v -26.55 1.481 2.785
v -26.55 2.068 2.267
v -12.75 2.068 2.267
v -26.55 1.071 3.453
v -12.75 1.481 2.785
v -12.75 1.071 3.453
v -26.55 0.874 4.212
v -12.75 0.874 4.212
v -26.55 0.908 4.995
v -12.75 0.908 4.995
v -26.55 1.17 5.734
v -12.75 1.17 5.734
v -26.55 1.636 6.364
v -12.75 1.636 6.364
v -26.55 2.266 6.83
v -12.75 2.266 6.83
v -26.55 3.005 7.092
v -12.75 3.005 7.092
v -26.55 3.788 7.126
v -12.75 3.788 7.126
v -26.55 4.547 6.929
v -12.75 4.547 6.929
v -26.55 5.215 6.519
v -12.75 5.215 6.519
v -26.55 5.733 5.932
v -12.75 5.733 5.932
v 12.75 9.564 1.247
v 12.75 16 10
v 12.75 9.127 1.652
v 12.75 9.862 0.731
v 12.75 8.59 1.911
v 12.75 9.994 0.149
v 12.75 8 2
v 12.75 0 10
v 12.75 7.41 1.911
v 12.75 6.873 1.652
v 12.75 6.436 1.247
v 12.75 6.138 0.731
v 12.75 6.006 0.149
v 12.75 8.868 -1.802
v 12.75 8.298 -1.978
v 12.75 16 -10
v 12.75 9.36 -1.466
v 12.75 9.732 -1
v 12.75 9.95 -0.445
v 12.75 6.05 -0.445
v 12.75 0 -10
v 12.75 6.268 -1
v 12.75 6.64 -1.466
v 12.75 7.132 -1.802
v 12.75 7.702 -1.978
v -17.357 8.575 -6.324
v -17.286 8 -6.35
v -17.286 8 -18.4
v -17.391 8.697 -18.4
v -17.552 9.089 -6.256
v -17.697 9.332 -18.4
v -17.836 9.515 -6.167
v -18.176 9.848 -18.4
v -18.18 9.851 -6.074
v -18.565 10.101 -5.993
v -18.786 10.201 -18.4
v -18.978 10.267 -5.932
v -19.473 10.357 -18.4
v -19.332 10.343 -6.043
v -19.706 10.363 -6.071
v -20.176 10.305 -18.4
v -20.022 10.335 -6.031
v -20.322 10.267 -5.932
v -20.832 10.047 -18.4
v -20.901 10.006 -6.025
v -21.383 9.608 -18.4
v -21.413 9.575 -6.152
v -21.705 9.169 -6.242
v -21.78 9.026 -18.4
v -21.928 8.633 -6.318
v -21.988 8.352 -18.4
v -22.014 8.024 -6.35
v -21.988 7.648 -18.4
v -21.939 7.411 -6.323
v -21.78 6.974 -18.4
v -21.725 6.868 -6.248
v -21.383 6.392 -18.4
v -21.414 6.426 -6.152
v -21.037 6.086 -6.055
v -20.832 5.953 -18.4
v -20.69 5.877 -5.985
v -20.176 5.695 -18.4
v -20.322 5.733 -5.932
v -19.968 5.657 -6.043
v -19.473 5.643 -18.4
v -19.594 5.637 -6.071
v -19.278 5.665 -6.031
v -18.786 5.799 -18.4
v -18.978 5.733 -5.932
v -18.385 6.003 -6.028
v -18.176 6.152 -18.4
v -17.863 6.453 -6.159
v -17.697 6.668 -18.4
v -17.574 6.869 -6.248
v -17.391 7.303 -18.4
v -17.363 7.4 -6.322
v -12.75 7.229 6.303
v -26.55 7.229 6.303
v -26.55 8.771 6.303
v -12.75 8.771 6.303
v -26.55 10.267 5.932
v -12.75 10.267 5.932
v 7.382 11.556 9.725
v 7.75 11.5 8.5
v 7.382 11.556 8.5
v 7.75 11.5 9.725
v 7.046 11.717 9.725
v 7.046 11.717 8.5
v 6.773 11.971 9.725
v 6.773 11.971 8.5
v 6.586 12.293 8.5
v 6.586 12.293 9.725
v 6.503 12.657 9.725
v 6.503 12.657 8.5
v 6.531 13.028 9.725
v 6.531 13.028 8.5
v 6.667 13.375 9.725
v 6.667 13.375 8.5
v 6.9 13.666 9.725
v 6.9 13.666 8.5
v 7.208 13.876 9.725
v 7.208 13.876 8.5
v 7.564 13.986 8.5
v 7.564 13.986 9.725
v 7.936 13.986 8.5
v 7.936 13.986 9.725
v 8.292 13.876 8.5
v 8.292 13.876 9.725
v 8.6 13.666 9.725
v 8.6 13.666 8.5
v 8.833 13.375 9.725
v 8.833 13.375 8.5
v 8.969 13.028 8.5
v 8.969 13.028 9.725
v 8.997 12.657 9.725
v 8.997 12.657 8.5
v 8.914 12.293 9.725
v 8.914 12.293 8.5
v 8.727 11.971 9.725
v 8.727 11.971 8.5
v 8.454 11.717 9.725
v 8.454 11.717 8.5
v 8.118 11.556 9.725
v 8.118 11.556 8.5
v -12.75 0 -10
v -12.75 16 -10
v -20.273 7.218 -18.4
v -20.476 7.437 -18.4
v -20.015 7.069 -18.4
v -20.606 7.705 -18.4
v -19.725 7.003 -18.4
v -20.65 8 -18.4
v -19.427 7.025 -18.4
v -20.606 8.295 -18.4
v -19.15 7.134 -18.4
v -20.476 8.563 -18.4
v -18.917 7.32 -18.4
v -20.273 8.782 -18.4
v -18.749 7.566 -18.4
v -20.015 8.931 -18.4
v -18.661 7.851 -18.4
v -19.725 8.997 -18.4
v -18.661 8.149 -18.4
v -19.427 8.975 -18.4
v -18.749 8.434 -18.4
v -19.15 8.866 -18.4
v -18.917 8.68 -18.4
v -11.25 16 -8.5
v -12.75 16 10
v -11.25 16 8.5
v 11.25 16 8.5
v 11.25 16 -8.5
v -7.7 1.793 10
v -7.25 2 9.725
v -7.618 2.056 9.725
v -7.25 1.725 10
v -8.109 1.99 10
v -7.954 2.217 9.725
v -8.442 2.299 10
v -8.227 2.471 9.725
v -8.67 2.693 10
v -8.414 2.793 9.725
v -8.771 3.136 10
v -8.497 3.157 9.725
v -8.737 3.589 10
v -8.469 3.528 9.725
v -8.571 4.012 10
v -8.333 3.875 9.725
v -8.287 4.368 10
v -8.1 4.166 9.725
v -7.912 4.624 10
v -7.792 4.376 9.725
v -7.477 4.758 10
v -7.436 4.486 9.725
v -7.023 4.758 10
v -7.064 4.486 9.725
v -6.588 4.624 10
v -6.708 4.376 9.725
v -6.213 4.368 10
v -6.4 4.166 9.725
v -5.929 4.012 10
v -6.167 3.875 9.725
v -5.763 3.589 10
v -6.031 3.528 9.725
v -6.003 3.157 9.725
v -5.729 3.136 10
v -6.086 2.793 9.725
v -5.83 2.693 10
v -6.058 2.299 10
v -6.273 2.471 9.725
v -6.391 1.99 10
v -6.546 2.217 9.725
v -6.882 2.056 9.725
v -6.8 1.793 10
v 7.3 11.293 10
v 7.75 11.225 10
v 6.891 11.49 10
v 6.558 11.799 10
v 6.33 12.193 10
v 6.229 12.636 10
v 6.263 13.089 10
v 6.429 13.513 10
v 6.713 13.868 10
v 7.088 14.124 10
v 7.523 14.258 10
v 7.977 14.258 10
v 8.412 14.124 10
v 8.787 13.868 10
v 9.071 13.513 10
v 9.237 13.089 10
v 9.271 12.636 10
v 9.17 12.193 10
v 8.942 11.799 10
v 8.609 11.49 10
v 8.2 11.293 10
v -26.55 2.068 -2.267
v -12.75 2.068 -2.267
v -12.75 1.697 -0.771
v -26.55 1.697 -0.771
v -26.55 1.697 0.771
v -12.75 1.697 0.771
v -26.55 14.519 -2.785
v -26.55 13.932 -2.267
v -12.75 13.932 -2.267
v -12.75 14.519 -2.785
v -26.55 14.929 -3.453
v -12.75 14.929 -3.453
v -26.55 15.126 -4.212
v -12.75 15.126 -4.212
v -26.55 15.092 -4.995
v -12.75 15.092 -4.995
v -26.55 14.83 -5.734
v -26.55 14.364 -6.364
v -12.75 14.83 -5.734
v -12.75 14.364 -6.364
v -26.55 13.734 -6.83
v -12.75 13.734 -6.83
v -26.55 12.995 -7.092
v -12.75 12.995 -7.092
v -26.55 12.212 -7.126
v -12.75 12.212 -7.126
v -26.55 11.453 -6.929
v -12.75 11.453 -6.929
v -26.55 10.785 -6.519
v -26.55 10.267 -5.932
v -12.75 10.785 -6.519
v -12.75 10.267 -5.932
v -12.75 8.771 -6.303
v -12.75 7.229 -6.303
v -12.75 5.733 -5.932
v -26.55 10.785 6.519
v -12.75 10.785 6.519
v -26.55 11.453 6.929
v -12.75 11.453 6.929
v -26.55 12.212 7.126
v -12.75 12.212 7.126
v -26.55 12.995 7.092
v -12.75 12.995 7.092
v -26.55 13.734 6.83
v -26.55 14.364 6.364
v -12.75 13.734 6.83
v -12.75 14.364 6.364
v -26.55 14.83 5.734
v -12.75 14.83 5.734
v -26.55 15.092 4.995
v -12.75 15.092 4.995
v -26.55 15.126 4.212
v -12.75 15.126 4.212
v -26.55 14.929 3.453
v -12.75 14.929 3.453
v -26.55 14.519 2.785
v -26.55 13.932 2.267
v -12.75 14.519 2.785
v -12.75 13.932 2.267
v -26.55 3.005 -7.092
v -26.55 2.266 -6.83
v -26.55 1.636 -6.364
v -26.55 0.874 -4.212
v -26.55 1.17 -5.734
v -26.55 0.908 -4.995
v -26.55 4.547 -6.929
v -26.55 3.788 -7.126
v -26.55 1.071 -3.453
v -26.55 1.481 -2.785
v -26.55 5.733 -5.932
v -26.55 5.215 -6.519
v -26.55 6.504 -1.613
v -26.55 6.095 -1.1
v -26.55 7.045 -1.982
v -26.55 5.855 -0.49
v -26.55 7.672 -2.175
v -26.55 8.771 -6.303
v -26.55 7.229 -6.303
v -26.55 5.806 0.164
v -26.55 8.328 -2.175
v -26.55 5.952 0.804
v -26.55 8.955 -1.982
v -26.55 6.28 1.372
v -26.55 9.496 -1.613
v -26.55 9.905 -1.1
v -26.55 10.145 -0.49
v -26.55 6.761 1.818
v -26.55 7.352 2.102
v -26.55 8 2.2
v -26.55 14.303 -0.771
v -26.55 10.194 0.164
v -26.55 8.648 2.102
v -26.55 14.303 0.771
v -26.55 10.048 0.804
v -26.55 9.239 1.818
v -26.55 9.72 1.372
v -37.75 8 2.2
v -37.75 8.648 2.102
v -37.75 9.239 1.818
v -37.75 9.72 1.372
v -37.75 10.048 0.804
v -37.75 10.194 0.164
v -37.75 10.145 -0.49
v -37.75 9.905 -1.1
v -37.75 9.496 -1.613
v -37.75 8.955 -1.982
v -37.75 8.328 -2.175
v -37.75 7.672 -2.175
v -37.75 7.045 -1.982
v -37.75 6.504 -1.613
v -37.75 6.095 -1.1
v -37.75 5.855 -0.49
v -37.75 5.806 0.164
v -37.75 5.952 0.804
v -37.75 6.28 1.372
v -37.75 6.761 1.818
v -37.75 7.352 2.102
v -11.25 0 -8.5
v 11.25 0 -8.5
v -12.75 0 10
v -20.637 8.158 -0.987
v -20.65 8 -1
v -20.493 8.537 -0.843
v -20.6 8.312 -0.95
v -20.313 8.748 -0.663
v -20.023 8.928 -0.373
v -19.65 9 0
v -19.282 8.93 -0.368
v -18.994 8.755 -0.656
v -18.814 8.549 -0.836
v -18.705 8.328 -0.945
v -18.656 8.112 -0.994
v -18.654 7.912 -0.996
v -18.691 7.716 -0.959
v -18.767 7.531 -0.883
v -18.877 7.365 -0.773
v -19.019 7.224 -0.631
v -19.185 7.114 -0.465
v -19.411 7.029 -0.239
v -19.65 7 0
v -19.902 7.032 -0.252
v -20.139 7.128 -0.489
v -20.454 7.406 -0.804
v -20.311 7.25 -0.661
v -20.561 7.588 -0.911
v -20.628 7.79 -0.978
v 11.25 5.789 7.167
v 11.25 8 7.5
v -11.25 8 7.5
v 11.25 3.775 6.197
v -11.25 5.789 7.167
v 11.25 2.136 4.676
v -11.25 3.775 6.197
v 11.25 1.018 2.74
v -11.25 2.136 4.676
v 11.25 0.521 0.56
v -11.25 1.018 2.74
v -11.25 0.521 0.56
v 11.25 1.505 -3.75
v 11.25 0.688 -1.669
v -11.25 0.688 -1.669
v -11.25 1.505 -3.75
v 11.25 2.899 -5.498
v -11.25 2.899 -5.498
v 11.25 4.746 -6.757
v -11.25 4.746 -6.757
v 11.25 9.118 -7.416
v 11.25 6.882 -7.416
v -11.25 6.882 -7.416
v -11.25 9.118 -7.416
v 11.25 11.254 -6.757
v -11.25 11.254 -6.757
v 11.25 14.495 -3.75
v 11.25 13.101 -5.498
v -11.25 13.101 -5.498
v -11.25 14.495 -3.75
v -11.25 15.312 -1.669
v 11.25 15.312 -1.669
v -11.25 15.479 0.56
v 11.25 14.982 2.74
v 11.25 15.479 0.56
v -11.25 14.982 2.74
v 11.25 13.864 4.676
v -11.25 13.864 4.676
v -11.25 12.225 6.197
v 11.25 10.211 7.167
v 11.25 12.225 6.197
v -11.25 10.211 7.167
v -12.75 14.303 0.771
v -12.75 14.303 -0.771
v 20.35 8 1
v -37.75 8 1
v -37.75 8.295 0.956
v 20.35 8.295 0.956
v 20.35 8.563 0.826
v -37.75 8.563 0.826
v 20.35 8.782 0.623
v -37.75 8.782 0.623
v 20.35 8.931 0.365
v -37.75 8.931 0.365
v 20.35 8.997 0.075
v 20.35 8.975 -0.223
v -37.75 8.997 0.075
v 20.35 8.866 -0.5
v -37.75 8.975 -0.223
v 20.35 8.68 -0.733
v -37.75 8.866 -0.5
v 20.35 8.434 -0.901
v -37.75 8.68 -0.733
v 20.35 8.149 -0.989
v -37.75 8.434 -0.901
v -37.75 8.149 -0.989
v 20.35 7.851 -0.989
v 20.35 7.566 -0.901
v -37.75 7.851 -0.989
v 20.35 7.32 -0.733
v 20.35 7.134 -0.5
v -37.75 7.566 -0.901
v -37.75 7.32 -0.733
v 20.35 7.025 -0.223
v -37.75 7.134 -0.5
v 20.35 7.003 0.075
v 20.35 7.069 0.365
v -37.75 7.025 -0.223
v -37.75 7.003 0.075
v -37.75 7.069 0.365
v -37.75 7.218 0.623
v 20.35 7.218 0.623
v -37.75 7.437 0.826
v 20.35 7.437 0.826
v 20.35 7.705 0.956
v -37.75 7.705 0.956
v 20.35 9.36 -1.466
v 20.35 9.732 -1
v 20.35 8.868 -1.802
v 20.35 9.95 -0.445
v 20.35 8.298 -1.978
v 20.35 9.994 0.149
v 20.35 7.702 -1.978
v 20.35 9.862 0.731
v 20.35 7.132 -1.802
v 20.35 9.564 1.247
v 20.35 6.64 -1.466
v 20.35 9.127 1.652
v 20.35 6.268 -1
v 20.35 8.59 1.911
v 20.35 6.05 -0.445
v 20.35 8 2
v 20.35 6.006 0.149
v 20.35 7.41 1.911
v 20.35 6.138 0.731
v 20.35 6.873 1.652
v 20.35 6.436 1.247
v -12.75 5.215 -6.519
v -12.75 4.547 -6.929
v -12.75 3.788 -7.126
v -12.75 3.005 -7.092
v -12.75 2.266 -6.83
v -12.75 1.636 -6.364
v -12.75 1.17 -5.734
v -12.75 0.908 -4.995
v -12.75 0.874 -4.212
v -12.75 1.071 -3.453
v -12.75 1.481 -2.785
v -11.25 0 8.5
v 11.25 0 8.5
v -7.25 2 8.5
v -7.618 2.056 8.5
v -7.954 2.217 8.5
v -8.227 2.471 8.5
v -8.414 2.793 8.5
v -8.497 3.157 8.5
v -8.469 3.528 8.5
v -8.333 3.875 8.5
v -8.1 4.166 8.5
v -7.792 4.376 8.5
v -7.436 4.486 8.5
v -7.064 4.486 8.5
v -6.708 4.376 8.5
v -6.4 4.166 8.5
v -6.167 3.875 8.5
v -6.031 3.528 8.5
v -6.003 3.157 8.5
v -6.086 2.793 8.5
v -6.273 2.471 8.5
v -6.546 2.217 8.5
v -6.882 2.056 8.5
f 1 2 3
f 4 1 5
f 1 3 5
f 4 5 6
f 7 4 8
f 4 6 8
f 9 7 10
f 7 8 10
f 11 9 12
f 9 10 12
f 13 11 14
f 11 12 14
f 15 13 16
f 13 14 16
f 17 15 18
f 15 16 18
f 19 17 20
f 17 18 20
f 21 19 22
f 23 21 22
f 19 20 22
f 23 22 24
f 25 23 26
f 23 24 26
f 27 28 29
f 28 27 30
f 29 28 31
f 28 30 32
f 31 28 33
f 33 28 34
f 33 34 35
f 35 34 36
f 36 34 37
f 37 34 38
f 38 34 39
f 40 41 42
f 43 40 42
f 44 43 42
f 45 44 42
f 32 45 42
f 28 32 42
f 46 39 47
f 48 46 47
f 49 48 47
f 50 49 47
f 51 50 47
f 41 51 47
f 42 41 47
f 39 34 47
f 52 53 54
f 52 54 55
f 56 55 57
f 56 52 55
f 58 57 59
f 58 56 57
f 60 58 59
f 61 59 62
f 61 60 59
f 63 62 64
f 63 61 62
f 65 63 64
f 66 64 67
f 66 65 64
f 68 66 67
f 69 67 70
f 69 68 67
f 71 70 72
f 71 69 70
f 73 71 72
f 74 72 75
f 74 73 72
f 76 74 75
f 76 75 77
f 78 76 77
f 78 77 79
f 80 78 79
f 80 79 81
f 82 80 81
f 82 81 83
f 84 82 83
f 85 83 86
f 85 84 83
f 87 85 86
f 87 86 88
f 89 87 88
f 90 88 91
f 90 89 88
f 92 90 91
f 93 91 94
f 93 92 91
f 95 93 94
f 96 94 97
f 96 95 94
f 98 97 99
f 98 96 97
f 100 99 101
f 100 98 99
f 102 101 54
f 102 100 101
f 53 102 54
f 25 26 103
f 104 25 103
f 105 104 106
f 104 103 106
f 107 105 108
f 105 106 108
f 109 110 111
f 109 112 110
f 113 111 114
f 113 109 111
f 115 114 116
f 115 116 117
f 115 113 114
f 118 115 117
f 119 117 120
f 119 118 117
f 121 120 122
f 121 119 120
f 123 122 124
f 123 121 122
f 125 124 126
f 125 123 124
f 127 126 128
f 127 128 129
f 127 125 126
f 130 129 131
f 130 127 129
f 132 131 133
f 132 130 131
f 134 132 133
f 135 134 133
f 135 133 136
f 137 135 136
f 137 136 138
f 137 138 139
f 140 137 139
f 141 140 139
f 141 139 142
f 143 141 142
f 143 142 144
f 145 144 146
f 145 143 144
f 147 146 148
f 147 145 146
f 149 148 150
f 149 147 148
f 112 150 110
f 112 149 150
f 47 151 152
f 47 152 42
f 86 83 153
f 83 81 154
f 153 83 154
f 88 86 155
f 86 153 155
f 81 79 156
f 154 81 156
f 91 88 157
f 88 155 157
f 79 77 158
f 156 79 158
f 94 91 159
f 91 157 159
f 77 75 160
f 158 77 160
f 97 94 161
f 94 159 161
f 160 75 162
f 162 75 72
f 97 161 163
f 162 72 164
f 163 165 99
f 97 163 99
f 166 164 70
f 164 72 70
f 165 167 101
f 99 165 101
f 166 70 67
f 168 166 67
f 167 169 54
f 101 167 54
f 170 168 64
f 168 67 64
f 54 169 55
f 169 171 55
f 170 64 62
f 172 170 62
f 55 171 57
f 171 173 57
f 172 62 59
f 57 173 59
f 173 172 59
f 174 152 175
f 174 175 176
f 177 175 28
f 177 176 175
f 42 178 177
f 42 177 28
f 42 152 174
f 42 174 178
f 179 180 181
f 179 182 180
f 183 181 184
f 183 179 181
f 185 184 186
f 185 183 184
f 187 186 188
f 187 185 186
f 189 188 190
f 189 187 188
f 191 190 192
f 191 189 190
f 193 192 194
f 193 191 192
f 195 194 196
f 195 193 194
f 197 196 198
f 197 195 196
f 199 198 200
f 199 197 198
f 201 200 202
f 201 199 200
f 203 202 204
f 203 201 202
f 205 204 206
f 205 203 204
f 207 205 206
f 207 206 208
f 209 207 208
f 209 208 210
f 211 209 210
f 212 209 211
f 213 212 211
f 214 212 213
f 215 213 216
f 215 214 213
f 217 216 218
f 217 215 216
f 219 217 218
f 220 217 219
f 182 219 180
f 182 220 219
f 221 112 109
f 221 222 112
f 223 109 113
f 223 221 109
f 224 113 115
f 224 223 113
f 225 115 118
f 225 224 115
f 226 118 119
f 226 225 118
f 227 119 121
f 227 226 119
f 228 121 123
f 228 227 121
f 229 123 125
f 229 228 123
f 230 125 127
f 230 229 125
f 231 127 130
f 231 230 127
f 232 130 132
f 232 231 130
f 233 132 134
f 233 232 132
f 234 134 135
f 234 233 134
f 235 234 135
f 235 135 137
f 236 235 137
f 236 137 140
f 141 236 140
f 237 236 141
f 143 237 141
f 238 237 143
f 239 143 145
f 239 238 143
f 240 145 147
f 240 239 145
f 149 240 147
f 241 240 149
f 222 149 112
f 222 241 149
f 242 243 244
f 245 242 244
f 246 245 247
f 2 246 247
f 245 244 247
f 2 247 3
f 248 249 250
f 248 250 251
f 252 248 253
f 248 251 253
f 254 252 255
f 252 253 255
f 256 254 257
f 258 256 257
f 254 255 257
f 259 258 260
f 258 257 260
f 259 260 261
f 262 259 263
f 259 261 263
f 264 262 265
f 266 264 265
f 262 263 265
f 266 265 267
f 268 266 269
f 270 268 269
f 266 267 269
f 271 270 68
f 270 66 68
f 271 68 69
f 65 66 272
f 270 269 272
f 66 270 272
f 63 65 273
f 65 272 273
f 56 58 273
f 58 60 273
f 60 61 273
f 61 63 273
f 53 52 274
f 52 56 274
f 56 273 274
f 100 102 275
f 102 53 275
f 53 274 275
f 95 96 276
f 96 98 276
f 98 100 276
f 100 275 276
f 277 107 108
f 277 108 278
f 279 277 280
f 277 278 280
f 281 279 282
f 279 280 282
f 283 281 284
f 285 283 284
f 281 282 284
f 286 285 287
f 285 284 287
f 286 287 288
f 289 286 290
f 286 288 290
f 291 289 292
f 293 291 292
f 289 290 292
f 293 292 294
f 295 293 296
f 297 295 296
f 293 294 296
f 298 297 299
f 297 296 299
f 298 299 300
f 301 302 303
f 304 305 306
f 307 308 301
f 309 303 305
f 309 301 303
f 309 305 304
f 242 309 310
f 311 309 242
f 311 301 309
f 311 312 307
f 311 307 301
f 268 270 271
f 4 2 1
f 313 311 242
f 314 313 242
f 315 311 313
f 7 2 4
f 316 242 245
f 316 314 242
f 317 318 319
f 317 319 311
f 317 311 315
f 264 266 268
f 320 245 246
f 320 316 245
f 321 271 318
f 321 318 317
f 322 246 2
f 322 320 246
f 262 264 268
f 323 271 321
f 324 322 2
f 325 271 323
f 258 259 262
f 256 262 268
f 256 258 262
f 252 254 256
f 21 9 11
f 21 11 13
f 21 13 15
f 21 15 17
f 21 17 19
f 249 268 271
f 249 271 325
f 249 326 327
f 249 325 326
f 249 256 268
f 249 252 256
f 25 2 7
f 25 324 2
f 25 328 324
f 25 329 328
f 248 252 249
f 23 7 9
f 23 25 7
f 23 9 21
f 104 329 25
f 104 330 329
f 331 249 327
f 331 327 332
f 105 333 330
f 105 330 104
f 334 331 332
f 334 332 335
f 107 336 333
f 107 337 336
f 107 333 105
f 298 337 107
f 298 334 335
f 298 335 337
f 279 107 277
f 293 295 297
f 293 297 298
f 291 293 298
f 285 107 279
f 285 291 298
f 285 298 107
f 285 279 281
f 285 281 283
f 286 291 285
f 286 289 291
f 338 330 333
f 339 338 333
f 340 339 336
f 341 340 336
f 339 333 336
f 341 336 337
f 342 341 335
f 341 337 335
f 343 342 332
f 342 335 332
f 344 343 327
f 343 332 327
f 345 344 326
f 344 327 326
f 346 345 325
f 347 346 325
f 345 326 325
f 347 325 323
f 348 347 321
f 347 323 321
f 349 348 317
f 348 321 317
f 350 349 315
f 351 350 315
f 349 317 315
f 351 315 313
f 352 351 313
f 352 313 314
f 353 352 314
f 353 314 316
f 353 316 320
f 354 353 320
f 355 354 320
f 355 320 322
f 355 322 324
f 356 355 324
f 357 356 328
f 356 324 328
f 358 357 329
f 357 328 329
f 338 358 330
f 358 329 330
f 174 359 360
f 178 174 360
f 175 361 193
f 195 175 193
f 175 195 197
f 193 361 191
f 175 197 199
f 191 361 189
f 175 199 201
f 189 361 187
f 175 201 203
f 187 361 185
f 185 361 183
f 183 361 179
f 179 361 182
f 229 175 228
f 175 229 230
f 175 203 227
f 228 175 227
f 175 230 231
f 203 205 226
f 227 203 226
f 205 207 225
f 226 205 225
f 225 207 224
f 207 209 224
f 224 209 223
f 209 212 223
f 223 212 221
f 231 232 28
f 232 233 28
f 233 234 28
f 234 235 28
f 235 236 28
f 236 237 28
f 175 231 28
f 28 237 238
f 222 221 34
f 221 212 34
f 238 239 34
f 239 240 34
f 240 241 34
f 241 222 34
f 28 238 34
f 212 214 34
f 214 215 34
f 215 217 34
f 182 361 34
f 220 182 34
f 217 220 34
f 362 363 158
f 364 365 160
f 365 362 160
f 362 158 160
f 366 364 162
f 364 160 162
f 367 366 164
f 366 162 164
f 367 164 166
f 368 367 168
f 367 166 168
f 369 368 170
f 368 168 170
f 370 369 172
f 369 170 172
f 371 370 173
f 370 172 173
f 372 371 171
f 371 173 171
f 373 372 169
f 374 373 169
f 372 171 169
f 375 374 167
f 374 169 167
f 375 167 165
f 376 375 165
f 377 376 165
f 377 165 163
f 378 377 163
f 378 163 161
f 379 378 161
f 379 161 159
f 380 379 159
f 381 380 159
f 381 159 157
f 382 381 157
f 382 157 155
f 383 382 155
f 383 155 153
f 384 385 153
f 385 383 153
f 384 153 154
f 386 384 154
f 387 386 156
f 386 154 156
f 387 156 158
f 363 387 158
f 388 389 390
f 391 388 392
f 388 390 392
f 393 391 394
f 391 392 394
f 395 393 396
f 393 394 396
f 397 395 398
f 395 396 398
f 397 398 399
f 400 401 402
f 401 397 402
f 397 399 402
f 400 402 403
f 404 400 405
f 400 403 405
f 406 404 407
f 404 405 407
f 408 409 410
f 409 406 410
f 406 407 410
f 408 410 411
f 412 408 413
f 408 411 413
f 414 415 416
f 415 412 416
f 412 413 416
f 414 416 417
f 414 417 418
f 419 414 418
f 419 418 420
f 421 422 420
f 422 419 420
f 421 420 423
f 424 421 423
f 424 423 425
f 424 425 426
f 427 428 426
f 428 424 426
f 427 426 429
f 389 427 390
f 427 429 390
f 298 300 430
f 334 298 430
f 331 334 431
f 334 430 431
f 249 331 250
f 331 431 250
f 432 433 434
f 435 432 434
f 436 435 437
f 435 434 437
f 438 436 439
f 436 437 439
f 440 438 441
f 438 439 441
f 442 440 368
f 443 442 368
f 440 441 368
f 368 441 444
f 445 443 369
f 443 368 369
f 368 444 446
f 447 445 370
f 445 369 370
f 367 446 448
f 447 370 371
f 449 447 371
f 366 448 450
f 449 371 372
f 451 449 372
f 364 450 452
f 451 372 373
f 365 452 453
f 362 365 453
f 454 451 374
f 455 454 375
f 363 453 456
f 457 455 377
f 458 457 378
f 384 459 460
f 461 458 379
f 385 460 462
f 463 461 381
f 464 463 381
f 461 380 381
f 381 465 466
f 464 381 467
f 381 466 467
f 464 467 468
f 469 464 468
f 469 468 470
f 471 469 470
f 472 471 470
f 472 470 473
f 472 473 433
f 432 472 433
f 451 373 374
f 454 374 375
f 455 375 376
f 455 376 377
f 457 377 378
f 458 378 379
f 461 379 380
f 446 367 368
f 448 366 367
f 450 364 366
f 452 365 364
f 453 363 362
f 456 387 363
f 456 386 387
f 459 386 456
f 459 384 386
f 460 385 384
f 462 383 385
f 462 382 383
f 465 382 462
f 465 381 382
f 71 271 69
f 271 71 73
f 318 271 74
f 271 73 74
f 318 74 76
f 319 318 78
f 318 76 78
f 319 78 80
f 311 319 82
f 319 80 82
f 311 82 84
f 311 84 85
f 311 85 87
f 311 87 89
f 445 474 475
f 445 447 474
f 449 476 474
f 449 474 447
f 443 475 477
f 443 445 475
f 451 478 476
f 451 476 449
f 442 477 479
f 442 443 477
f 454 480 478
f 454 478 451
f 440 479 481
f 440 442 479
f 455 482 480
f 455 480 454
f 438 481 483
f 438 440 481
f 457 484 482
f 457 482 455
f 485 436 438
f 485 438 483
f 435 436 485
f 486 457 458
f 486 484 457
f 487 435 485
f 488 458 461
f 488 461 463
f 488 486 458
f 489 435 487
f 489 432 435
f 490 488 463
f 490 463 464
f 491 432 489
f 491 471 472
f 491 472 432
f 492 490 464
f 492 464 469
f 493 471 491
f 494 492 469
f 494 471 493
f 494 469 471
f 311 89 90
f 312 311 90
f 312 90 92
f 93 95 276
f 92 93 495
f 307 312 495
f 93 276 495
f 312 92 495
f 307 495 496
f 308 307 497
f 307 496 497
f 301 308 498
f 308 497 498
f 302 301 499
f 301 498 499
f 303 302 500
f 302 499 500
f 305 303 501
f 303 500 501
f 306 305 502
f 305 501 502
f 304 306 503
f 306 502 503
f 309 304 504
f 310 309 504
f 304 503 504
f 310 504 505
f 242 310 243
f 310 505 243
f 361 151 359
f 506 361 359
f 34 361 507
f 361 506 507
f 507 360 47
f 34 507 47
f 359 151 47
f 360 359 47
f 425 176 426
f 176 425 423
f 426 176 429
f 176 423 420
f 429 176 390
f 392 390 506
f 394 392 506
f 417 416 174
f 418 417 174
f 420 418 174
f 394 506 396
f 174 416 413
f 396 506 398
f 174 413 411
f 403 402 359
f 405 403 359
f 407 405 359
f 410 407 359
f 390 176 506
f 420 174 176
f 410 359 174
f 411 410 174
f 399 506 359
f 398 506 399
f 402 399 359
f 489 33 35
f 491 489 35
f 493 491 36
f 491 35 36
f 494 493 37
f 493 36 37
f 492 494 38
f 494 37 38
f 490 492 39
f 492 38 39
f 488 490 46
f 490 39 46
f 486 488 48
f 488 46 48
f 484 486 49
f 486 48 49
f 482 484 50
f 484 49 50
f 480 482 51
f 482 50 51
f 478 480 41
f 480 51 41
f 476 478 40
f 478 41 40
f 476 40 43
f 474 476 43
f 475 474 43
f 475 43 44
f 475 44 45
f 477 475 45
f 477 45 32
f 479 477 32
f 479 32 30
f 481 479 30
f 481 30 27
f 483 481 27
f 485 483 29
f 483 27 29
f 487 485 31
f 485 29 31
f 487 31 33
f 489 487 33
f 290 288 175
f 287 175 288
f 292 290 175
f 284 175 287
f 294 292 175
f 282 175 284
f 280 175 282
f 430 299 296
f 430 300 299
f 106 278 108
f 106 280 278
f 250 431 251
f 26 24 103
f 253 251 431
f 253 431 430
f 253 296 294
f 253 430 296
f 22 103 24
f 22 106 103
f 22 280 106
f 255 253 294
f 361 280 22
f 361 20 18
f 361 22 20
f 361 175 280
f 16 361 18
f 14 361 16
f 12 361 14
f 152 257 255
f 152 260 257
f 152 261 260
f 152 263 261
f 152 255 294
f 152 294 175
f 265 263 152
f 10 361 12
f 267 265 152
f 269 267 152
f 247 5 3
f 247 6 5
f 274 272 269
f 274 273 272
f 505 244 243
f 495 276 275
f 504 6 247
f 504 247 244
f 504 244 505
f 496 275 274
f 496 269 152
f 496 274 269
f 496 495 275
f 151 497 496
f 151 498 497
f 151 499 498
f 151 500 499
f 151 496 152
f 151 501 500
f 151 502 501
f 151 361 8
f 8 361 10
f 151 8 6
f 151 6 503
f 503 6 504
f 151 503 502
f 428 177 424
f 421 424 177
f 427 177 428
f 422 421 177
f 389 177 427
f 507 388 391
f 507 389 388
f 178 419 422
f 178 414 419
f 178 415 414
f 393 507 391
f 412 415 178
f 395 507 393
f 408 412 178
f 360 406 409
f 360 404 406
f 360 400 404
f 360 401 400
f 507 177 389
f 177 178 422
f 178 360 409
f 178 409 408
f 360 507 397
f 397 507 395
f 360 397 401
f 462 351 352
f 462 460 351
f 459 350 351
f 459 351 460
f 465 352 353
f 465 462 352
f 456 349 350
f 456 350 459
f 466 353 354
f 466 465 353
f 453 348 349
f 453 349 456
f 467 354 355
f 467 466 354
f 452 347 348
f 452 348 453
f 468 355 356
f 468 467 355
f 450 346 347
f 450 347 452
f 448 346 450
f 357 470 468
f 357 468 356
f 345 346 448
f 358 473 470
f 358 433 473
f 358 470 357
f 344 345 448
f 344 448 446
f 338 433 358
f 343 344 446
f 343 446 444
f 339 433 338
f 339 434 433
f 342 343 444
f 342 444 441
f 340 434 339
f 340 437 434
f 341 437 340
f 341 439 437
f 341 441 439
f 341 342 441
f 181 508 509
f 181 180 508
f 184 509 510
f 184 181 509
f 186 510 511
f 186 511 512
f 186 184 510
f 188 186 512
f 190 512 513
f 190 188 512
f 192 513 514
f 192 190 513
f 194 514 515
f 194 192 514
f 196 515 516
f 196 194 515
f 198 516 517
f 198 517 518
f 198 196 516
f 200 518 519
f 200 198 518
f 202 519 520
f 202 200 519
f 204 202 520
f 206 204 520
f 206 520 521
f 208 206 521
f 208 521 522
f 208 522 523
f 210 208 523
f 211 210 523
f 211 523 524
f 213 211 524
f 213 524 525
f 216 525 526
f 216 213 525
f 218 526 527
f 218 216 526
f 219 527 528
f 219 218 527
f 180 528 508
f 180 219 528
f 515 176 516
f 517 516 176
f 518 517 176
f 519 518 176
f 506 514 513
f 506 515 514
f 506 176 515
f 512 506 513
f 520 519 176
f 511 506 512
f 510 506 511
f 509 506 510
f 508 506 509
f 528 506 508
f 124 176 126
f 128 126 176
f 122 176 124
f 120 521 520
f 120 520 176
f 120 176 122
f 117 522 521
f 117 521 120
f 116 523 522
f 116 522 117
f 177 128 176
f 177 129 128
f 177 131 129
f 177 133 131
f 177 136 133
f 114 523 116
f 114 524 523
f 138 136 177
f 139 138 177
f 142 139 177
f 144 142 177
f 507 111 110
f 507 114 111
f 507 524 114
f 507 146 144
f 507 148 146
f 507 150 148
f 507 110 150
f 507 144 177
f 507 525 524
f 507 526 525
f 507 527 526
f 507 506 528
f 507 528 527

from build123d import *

# Parameters (mm, degrees)
SKETCH_1_W          = 25.5
SKETCH_1_H          = 20
SKETCH_1_W_2        = 22.5
SKETCH_1_H_2        = 17
EXTRUDE_1_DEPTH     = 16
M3X0_5_1_AT_2_COUNT = 2
M3X0_5_1_AT_2_PITCH = 17.755280905
EXTRUDE_2_REACH     = 32.529
SKETCH_4_R          = 7.5
EXTRUDE_3_DEPTH     = 13.8
SKETCH_6_R          = 2
EXTRUDE_4_DEPTH     = 7.6
SKETCH_7_R          = 2.2
EXTRUDE_5_DEPTH     = 11.2
SKETCH_9_R          = 2.363999551
EXTRUDE_6_DEPTH     = 18.4
SKETCH_10_R         = 1
CUT_EXTRUDE_1_DEPTH = 64.009285059
SKETCH_11_R         = 1
CUT_EXTRUDE_2_DEPTH = 18.4


with BuildPart() as part:
    # 草图1 → 凸台-拉伸1 (new body)
    with BuildSketch(Plane(origin=(0, 0, 0), x_dir=(1, 0, 0), z_dir=(0, 1, 0))):
        Rectangle(SKETCH_1_W, SKETCH_1_H)
        Rectangle(SKETCH_1_W_2, SKETCH_1_H_2, mode=Mode.SUBTRACT)
    extrude(amount=EXTRUDE_1_DEPTH)

    # 草图3 → M3x0.5 螺纹孔1 (revolve, cut)
    with BuildSketch(Plane(origin=(7.75, 12.75, 10), x_dir=(0, -1, 0), z_dir=(1, 0, 0))):
        Polygon((0, 0), (0, 1.5), (1.25, 1.5), (1.25, 0.275), (1.525, 0), align=None)
    m3x0_5_1 = revolve(axis=Axis((7.75, 12.75, 16.35), (0, 0, -1)), mode=Mode.SUBTRACT)

    # M3x0.5 螺纹孔1 at 2: M3x0.5 螺纹孔1 ×2
    with Locations(*[Vector(-0.8448190755542286, -0.5350520811843448, 0) * (i * M3X0_5_1_AT_2_PITCH) for i in range(1, M3X0_5_1_AT_2_COUNT)]):
        add(m3x0_5_1, mode=Mode.SUBTRACT)

    # 草图4 → 凸台-拉伸2 (add, up to next)
    with BuildSketch(Plane(origin=(-11.25, 0, 0), x_dir=(0, 0, -1), z_dir=(1, 0, 0)), mode=Mode.PRIVATE) as extrude_2_sk1:
        with Locations(Location((0, 8, 0), (0, 0, 180))):
            Circle(SKETCH_4_R)
    extrude_2_tool1 = extrude(extrude_2_sk1.sketch, amount=EXTRUDE_2_REACH, mode=Mode.PRIVATE) - part.part
    add(extrude_2_tool1.solids().sort_by_distance((-11.25, 8, 0))[0])

    # 草图5 → 凸台-拉伸3 (add)
    with BuildSketch(Plane.ZY.offset(12.75)):
        with BuildLine():
            ThreePointArc((-5.931717466, 10.266545369), (-6.35, 8), (-5.931717466, 5.733454631))
            ThreePointArc((-5.931717466, 5.733454631), (-6.363961031, 1.636038969), (-2.266545369, 2.068282534))
            ThreePointArc((-2.266545369, 2.068282534), (0, 1.65), (2.266545369, 2.068282534))
            ThreePointArc((2.266545369, 2.068282534), (6.363961031, 1.636038969), (5.931717466, 5.733454631))
            ThreePointArc((5.931717466, 5.733454631), (6.35, 8), (5.931717466, 10.266545369))
            ThreePointArc((5.931717466, 10.266545369), (6.363961031, 14.363961031), (2.266545369, 13.931717466))
            ThreePointArc((2.266545369, 13.931717466), (0, 14.35), (-2.266545369, 13.931717466))
            ThreePointArc((-2.266545369, 13.931717466), (-6.363961031, 14.363961031), (-5.931717466, 10.266545369))
        make_face()
    extrude(amount=EXTRUDE_3_DEPTH)

    # 草图6 → 凸台-拉伸4 (add)
    with BuildSketch(Plane(origin=(12.75, 0, 0), x_dir=(0, 0, -1), z_dir=(1, 0, 0))):
        with Locations(Location((0, 8, 0), (0, 0, 180))):
            Circle(SKETCH_6_R)
    extrude(amount=EXTRUDE_4_DEPTH)

    # 草图7 → 凸台-拉伸5 (add)
    with BuildSketch(Plane.ZY.offset(26.55)):
        with Locations((0, 8)):
            Circle(SKETCH_7_R)
    extrude(amount=EXTRUDE_5_DEPTH)

    # 草图9 → 凸台-拉伸6 (add)
    with BuildSketch(Plane.XY):
        with Locations((-19.65, 8)):
            Circle(SKETCH_9_R)
    extrude(amount=-EXTRUDE_6_DEPTH)

    # 草图10 → 切除-拉伸1 (cut, through all)
    with BuildSketch(Plane.ZY.offset(37.75)):
        with Locations((0, 8)):
            Circle(SKETCH_10_R)
    extrude(amount=-CUT_EXTRUDE_1_DEPTH, mode=Mode.SUBTRACT)

    # 草图11 → 切除-拉伸2 (cut)
    with BuildSketch(Plane(origin=(0, 0, -18.4), x_dir=(-1, 0, 0), z_dir=(0, 0, -1))):
        with Locations((19.65, 8)):
            Circle(SKETCH_11_R)
    extrude(amount=-CUT_EXTRUDE_2_DEPTH, mode=Mode.SUBTRACT)


solid = part.part
